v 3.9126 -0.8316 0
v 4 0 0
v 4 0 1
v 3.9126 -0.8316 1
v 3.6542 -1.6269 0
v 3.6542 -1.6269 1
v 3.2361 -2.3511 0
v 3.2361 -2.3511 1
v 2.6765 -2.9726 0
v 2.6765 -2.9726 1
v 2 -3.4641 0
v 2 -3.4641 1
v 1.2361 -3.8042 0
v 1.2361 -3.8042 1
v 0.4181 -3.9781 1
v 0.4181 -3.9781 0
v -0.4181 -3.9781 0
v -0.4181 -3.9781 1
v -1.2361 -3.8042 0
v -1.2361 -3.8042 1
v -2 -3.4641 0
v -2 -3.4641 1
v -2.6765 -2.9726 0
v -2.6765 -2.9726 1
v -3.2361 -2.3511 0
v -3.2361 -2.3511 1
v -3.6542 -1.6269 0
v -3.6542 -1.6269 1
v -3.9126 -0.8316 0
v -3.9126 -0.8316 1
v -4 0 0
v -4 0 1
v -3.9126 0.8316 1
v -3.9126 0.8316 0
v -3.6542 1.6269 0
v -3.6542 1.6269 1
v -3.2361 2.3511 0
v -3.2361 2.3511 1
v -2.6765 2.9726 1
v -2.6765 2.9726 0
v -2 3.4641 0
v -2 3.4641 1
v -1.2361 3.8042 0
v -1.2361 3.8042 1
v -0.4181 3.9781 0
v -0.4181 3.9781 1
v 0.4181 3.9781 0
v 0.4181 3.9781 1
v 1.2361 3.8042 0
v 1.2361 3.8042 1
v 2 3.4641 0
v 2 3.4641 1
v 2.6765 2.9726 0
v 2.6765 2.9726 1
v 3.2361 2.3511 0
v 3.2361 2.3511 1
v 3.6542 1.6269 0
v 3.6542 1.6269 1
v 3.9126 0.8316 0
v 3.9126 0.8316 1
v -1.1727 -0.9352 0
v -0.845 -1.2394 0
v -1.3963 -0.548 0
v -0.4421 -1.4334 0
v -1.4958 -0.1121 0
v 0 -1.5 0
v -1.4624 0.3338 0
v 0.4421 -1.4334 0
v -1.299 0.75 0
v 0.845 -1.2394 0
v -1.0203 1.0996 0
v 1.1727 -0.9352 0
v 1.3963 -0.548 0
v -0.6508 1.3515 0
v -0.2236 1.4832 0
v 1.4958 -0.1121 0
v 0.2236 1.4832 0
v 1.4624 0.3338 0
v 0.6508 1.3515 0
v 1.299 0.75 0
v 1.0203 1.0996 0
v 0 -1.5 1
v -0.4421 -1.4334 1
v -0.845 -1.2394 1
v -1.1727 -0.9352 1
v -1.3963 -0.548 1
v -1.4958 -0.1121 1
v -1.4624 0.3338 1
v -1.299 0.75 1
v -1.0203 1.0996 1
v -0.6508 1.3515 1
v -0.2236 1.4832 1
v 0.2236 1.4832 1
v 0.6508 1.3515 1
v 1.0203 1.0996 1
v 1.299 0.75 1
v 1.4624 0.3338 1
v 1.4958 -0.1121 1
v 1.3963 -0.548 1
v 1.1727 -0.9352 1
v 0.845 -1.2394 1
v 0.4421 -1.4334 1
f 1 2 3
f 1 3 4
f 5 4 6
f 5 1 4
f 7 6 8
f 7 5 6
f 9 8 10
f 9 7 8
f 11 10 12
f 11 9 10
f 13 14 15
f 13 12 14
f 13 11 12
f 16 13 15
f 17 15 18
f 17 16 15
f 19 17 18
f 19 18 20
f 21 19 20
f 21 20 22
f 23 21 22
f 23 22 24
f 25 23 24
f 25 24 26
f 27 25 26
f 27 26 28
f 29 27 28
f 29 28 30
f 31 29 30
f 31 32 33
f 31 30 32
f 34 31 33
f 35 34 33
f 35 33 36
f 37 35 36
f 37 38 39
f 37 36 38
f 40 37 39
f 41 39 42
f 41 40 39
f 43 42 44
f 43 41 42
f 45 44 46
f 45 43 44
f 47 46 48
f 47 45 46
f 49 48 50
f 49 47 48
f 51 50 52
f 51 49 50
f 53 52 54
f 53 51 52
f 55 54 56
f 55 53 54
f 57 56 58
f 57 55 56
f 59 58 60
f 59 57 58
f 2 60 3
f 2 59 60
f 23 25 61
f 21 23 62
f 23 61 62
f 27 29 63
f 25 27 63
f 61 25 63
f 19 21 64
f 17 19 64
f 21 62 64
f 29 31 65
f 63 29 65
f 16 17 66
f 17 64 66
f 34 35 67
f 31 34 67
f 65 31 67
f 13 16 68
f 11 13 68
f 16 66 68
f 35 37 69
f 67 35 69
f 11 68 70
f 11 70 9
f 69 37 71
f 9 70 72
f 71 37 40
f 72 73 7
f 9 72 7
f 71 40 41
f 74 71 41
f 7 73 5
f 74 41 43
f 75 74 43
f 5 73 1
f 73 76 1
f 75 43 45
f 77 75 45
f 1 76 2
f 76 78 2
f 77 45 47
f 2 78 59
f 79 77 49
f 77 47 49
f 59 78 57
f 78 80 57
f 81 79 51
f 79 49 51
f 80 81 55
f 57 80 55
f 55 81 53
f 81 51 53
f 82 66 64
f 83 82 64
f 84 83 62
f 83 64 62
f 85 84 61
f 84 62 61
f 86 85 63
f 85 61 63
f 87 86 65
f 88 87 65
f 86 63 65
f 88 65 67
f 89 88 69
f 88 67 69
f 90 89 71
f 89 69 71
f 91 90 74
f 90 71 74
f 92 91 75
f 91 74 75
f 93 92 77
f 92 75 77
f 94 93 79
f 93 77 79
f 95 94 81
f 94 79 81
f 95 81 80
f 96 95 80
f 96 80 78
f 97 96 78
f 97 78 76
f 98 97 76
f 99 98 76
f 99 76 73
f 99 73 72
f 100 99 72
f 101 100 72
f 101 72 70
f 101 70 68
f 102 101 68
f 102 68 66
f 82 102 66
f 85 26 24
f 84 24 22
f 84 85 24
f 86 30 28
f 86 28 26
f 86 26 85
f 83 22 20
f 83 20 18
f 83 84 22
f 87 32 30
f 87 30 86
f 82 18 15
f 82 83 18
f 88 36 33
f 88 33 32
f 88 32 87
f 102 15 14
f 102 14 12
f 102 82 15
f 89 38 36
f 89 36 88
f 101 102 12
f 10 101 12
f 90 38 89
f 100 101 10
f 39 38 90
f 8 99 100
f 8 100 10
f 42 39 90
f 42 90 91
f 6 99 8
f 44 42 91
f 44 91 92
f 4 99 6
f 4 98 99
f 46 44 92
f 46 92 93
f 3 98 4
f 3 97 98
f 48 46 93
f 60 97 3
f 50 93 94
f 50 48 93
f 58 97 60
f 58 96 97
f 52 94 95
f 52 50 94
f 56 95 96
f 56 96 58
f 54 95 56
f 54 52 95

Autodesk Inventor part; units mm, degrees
ref_plane "YZ Plane" through (0, 0, 0) normal (1, 0, 0) x (0, 1, 0)
ref_plane "XZ Plane" through (0, 0, 0) normal (0, 1, 0) x (-1, 0, 0)
ref_plane "XY Plane" through (0, 0, 0) normal (0, 0, 1) x (1, 0, 0)
sketch "スケッチ1" plane through (0, 0, 0) normal (0, 0, 1) x (1, 0, 0)
  circle A0 centre (0, 0) radius 4
  dimension "d0" = 8
extrude "押し出し1" add sketch "スケッチ1" along normal blind 1
sketch "スケッチ2" plane through (0, 0, 1) normal (0, 0, 1) x (1, 0, 0)
  circle A0 centre (0, 0) radius 2.5
  dimension "d3" = 5
extrude "押し出し2" add sketch "スケッチ2" along normal blind 5
sketch "スケッチ3" plane through (0, 0, 6) normal (0, 0, 1) x (1, 0, 0)
  point P0 (0, 0)
  point P1 (0, 0)
hole "穴1" at (0, 0, 6) direction (0, 0, -1) diameter 3 end through all
sketch "スケッチ4" plane through (0, 0, 6) normal (0, 0, 1) x (1, 0, 0)
  circle A0 centre (0, 0) radius 2.5
extrude "押し出し3" cut sketch "スケッチ4" against normal up to surface (5 mm away)
properties part number "RD017"
